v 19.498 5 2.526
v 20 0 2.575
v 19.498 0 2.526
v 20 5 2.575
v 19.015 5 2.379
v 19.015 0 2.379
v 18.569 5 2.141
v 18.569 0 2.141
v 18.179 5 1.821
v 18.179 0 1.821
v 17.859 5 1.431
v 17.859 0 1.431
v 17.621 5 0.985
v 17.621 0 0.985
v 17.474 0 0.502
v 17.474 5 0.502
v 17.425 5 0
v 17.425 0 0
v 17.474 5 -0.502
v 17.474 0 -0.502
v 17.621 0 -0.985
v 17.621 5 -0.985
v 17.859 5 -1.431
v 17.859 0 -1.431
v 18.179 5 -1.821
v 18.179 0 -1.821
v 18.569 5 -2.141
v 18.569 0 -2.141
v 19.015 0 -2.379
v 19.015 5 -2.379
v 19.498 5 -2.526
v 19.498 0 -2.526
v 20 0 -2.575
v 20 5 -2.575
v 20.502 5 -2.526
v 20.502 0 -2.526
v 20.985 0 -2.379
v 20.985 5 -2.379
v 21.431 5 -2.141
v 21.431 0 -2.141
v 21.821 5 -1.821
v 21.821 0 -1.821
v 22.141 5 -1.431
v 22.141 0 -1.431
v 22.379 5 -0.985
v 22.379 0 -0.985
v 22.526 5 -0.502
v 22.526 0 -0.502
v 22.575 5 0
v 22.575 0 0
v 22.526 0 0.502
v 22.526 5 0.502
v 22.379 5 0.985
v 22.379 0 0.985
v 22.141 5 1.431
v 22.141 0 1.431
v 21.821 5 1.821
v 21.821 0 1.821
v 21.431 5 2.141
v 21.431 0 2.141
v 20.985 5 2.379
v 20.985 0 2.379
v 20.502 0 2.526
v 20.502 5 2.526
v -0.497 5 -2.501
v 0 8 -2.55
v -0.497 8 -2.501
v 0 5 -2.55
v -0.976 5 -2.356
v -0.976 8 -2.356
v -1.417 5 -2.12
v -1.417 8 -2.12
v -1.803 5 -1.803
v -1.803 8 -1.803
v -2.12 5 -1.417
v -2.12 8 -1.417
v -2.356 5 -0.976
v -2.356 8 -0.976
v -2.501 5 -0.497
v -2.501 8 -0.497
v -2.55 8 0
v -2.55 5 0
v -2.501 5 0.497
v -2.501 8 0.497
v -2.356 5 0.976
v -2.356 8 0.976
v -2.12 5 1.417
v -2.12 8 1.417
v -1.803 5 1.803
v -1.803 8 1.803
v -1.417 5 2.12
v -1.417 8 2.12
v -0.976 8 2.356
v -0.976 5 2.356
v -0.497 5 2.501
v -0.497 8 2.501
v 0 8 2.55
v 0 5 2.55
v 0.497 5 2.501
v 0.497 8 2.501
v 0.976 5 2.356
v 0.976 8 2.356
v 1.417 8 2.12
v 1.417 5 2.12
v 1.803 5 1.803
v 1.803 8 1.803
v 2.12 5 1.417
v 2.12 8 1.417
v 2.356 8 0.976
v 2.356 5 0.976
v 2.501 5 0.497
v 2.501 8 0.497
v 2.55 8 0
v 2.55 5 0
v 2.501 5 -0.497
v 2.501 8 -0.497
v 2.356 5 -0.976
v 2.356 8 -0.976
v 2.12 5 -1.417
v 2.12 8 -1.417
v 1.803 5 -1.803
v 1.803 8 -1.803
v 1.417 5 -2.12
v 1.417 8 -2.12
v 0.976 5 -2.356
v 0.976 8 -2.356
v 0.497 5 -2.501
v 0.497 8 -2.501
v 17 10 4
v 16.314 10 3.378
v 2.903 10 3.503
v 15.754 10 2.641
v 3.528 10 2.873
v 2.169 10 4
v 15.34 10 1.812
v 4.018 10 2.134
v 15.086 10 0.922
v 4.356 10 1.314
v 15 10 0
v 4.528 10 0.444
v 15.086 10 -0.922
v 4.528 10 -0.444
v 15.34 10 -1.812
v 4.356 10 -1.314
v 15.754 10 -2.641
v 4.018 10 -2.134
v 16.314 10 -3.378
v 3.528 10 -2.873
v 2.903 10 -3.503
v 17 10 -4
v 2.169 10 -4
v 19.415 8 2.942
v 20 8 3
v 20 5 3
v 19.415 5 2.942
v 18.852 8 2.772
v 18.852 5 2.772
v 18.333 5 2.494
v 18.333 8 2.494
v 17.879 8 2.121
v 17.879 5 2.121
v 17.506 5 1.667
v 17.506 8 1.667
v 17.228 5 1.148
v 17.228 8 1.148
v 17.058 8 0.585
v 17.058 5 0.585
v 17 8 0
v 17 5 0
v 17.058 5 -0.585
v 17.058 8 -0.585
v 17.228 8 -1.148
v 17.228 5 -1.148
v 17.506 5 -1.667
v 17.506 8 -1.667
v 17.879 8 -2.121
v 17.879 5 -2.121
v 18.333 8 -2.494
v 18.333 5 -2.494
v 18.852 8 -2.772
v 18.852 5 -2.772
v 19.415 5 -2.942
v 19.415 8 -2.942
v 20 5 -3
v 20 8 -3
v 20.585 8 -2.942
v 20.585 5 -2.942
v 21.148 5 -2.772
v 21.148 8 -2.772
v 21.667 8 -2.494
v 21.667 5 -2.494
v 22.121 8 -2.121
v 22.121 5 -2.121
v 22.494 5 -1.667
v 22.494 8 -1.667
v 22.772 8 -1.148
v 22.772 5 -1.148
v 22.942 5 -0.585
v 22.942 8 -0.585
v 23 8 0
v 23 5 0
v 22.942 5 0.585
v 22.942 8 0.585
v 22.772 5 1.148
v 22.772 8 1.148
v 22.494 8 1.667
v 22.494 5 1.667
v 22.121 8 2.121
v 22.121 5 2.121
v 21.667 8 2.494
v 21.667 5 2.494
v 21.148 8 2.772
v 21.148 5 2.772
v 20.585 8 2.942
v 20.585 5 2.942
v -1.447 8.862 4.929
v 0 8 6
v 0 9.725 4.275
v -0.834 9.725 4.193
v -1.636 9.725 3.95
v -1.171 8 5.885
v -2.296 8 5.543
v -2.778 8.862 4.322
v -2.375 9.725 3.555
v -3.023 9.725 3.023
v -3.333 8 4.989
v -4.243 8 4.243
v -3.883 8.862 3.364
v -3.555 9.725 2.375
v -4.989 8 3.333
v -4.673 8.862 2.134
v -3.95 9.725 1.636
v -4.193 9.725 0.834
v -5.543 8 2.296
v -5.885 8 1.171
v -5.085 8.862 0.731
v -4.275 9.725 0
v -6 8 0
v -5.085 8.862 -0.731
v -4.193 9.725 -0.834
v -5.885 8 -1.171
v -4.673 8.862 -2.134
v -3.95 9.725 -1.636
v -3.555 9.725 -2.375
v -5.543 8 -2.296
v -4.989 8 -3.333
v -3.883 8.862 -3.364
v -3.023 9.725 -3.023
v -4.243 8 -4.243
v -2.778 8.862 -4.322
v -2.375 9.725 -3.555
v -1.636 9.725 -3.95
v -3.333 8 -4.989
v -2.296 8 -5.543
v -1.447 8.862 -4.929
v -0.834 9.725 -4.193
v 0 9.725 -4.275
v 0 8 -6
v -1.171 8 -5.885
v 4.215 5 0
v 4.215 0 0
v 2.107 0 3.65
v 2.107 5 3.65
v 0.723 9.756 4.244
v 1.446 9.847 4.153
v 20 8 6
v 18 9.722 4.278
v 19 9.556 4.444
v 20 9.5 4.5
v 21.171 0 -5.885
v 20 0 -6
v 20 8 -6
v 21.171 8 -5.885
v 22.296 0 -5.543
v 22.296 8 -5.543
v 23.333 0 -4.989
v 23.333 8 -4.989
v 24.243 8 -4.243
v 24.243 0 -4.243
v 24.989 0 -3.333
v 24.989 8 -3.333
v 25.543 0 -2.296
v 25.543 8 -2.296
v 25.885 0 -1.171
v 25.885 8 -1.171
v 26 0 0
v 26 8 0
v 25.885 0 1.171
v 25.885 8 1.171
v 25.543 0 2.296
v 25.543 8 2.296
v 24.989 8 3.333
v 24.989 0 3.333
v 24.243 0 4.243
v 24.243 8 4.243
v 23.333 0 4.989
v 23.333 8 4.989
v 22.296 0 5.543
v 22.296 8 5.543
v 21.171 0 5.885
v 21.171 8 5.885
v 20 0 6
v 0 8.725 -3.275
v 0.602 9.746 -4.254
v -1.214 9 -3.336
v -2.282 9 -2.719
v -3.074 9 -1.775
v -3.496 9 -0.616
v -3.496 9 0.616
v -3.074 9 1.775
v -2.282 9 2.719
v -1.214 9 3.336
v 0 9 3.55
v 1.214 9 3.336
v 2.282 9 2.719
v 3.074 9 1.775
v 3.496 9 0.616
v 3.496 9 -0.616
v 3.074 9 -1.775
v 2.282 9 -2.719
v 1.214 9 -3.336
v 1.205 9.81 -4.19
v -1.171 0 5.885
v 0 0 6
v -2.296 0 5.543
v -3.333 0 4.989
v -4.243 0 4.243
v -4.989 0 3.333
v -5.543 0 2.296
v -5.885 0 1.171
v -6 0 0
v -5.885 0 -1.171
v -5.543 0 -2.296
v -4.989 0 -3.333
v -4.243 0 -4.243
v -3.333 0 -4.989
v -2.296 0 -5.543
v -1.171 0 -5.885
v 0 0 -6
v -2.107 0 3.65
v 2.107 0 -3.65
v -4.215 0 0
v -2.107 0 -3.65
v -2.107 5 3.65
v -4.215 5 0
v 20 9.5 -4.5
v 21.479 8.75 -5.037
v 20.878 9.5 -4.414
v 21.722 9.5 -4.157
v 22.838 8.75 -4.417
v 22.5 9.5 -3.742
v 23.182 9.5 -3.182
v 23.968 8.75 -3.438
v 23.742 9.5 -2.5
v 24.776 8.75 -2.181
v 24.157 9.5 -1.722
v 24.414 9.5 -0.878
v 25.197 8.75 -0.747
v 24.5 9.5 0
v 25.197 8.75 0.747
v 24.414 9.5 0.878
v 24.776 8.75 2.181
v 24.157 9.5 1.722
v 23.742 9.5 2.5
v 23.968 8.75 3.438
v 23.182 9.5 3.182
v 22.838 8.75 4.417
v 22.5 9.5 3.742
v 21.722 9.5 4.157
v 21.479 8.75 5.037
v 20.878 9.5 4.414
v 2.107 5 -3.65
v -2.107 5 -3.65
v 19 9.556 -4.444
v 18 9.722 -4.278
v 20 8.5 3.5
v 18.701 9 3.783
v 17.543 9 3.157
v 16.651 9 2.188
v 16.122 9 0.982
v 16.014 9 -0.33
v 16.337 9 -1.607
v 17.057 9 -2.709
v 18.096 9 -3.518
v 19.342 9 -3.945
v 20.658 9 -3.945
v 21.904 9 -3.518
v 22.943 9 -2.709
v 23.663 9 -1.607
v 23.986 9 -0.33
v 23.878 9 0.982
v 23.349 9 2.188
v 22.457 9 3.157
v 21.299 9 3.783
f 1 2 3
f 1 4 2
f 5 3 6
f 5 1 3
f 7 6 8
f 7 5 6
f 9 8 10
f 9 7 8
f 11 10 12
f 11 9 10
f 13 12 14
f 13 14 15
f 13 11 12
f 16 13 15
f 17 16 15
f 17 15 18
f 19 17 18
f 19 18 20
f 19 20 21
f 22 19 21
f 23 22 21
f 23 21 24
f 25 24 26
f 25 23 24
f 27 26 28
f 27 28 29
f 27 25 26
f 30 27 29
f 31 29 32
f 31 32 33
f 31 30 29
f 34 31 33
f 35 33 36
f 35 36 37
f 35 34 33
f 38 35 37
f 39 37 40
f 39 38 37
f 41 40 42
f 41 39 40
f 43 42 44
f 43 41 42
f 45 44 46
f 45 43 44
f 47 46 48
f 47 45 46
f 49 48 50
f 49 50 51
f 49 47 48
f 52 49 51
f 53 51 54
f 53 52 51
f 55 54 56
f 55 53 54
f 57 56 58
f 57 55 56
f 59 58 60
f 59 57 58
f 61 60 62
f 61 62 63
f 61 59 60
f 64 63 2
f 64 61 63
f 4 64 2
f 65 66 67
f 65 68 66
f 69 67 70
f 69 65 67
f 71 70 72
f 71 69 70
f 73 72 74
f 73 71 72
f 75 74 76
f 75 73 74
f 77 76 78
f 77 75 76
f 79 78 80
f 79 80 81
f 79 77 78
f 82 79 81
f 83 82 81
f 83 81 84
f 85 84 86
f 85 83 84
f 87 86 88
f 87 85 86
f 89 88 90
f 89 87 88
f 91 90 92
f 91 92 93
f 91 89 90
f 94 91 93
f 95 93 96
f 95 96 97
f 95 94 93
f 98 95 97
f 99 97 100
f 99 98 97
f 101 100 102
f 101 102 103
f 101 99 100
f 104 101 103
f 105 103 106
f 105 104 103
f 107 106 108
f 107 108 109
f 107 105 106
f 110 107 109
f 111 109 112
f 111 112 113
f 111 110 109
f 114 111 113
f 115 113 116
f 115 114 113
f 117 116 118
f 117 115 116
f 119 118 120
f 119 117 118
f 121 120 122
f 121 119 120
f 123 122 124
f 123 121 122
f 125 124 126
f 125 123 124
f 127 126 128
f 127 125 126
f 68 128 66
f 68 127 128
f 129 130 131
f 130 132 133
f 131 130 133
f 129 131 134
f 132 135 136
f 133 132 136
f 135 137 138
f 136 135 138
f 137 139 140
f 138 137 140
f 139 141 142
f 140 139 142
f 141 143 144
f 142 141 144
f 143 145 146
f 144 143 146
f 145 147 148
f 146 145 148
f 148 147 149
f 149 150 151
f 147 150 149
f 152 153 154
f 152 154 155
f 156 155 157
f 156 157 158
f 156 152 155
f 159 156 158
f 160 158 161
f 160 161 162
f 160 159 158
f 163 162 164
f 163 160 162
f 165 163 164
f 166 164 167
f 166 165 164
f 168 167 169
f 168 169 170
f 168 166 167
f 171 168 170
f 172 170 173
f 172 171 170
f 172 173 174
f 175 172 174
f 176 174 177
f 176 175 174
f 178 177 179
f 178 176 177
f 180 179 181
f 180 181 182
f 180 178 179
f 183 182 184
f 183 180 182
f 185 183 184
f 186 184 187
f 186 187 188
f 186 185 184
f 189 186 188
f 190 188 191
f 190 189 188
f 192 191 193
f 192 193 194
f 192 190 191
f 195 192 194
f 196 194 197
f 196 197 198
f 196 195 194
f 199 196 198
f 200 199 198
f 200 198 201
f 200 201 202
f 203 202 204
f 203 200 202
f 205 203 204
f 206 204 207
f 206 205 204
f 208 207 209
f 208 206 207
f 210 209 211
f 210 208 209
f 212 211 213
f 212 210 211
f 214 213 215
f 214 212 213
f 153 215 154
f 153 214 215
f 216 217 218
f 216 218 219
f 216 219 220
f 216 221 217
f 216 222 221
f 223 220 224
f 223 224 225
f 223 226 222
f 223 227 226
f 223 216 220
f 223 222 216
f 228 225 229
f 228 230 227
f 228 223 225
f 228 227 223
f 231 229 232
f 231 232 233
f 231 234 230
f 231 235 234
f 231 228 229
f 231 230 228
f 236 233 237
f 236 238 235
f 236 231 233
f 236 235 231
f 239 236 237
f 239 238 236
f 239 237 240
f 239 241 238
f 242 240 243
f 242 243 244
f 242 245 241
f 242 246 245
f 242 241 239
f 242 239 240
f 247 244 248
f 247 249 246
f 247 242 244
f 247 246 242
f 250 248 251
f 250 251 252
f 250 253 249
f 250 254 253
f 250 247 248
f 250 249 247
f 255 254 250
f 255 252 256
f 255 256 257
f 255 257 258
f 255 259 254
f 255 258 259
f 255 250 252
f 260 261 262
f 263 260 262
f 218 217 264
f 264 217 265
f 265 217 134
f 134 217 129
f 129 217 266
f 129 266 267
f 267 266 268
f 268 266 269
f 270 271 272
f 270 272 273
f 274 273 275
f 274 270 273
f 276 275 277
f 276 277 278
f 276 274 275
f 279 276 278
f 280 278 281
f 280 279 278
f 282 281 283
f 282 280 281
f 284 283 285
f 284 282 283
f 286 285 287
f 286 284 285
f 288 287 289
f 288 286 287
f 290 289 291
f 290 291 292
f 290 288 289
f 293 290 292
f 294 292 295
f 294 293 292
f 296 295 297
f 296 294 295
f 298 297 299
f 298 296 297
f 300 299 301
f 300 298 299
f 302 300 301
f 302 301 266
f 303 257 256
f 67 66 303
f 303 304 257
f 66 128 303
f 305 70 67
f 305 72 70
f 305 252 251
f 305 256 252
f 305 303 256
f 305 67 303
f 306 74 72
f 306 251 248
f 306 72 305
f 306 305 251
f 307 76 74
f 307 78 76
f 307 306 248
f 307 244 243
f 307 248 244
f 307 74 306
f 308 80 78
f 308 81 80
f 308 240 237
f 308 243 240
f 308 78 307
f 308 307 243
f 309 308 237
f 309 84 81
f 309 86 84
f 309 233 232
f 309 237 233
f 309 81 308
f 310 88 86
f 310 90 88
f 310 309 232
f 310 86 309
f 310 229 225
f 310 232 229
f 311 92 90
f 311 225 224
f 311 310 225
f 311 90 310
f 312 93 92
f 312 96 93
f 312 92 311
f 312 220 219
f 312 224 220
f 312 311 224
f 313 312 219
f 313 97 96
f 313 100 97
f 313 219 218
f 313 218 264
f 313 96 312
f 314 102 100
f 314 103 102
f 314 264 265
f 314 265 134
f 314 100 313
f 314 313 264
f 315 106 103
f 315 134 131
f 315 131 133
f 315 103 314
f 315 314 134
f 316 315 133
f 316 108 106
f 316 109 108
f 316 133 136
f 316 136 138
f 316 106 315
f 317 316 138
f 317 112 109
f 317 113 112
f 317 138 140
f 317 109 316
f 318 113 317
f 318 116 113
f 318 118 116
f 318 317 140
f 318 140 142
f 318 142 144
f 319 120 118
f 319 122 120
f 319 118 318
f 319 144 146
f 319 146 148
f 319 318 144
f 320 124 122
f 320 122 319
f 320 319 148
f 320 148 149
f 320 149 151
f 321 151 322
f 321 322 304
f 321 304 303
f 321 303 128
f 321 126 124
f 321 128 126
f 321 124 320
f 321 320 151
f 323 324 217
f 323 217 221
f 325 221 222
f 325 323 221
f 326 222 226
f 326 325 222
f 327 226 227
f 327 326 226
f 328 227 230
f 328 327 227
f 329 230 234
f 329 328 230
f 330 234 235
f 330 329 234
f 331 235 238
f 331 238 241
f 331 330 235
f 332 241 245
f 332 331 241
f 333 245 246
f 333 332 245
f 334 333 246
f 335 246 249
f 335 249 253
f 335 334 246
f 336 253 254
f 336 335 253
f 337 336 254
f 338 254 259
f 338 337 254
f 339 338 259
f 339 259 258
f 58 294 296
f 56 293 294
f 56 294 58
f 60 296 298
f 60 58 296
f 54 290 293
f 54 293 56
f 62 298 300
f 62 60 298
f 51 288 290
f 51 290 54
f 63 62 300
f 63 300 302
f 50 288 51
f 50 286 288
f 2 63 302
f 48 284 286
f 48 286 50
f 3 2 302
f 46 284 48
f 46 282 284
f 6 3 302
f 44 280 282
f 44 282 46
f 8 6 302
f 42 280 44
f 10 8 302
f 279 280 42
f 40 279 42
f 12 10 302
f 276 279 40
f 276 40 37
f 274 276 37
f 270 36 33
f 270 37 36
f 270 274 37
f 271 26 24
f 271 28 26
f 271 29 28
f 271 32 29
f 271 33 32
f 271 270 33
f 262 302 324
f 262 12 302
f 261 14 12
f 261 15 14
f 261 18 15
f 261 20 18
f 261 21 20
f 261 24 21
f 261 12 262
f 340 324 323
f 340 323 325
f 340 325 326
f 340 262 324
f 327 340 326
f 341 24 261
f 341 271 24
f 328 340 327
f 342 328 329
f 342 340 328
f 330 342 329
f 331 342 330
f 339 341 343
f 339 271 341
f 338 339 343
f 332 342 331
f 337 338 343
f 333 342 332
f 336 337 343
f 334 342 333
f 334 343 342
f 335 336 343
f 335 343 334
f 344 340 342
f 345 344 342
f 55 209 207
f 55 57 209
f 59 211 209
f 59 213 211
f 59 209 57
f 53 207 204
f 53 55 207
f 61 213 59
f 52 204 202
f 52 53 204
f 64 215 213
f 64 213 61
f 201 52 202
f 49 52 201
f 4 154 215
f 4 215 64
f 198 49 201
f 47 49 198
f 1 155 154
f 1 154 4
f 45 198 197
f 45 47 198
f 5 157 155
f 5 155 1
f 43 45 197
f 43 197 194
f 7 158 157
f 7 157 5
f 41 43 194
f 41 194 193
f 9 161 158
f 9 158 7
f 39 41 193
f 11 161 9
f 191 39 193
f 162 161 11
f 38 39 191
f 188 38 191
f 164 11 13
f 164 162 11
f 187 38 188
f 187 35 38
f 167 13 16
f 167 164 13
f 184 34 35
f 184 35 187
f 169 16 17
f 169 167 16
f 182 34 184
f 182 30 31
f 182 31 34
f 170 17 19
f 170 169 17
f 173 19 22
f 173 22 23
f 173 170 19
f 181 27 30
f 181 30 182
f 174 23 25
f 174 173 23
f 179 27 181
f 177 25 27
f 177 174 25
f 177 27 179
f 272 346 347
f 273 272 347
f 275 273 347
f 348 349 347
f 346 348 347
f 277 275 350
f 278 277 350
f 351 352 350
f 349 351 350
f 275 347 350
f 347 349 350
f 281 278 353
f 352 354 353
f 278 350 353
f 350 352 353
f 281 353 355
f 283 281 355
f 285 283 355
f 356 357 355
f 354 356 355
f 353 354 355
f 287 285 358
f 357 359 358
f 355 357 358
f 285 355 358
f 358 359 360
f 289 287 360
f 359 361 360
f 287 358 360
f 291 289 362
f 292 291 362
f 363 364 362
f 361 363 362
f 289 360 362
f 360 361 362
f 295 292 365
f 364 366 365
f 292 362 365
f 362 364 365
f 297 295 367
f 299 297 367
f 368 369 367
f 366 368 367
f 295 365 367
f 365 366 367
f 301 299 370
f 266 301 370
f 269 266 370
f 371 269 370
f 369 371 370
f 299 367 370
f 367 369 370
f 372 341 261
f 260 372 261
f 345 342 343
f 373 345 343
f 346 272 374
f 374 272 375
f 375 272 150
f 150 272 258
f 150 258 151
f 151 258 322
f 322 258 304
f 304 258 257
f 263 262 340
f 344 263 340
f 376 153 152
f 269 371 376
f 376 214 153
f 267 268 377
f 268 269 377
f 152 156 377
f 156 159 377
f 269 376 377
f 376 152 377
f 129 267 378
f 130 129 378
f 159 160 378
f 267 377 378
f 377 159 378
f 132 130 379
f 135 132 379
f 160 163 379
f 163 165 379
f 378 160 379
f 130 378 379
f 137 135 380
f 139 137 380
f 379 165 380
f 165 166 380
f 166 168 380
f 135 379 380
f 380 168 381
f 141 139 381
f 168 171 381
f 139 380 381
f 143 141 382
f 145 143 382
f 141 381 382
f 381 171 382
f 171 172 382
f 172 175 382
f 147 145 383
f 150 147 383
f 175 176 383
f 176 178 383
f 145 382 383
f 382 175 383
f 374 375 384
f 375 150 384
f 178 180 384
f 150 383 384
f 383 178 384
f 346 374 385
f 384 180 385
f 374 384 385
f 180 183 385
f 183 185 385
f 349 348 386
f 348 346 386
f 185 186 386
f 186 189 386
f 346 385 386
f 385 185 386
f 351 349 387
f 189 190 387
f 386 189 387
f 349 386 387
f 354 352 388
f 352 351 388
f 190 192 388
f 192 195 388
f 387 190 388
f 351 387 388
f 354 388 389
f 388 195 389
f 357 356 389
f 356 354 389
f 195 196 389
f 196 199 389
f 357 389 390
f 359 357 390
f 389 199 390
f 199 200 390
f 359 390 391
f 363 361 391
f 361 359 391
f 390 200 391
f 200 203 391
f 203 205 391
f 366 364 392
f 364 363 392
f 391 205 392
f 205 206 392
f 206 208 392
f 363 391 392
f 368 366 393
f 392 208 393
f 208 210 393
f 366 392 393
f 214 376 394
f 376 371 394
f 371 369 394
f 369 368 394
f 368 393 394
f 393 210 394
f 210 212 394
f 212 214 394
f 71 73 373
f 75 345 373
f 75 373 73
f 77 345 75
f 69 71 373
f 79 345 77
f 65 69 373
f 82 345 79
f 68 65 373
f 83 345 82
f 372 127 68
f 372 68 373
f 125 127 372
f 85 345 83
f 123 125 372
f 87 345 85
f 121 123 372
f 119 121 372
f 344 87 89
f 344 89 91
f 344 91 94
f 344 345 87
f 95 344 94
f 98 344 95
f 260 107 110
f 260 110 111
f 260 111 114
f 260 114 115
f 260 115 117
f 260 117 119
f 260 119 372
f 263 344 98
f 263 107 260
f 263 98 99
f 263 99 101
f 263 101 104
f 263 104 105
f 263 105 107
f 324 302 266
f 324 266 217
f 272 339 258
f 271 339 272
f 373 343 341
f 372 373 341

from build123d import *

# Parameters (mm, degrees)
EXTRUDE_1_DEPTH     = 10
CHAMFER_1_SIZE      = 2
CUT_EXTRUDE_1_DEPTH = 5


with BuildPart() as part:
    # 草图1 → 凸台-拉伸1 (new body)
    with BuildSketch(Plane(origin=(0, 0, 0), x_dir=(1, 0, 0), z_dir=(0, 1, 0))):
        with BuildLine():
            Line((0, 6), (20, 6))
            ThreePointArc((20, 6), (26, 0), (20, -6))
            Line((20, -6), (0, -6))
            ThreePointArc((0, -6), (-6, 0), (0, 6))
        make_face()
    extrude(amount=EXTRUDE_1_DEPTH)

    # 草图2 → 切除-旋转1 (revolve, cut)
    with BuildSketch(Plane.XY, mode=Mode.PRIVATE) as cut_revolve_1_sk:
        Polygon((-2.55, 10), (-2.55, 5), (-1.6, 5), (-1.6, 2), (-2.55, 2), (-2.55, 0), (0, 0), (0, 10), align=None)
    revolve(cut_revolve_1_sk.sketch.rotate(Axis((0, 0, 0), (0, 1, 0)), 270), axis=Axis((0, 0, 0), (0, 1, 0)), mode=Mode.SUBTRACT)

    # 草图3 → 切除-旋转2 (revolve, cut)
    with BuildSketch(Plane.XY, mode=Mode.PRIVATE) as cut_revolve_2_sk:
        Polygon((20, 0), (17.425, 0), (17.425, 5), (17, 5), (17, 10), (20, 10), align=None)
    revolve(cut_revolve_2_sk.sketch.rotate(Axis((20, 10, 0), (0, -1, 0)), 270), axis=Axis((20, 10, 0), (0, -1, 0)), mode=Mode.SUBTRACT)

    # 倒角1
    # the kernel refuses this chamfer: 2 mm, written as the material it takes off along each edge
    with BuildSketch(Plane(origin=(20, 10, 0), x_dir=(0, 0, -1), z_dir=(-1, 0, 0))) as chamfer_1_piece_1:
        Polygon((6, CHAMFER_1_SIZE), (6 - CHAMFER_1_SIZE, 0), (6, 0), align=None)
    revolve(axis=Axis((20, 10, 0), (0, -1, 0)), revolution_arc=180, mode=Mode.SUBTRACT)
    with BuildSketch(Plane(origin=(0, 10, 0), x_dir=(0, 0, -1), z_dir=(1, 0, 0))) as chamfer_1_piece_2:
        Polygon((2.55 + CHAMFER_1_SIZE, 0), (2.55, -CHAMFER_1_SIZE), (2.55, 0), align=None)
    revolve(axis=Axis((0, 10, 0), (0, 1, 0)), mode=Mode.SUBTRACT)
    with BuildSketch(Plane(origin=(0, 10, -6), x_dir=(0, -0.9996219169112968, -0.027495876610586487), z_dir=(1, 0, 0)), Plane(origin=(20, 10, 6), x_dir=(0, -0.9996219169112968, 0.027495876610586487), z_dir=(-1, 0, 0))) as chamfer_1_piece_3:
        Polygon((CHAMFER_1_SIZE * 0.999621916911, -CHAMFER_1_SIZE * 0.0274958766106), (-CHAMFER_1_SIZE * 0.0274958766106, -CHAMFER_1_SIZE * 0.999621916911), (0, 0), align=None)
    extrude(amount=20, mode=Mode.SUBTRACT)
    with BuildSketch(Plane(origin=(20, 10, 0), x_dir=(0, 0, 1), z_dir=(1, 0, 0))) as chamfer_1_piece_4:
        Polygon((3 + CHAMFER_1_SIZE, 0), (3, CHAMFER_1_SIZE), (3, 0), align=None)
    revolve(axis=Axis((20, 10, 0), (0, -1, 0)), mode=Mode.SUBTRACT)
    with BuildSketch(Plane(origin=(0, 10, 0), x_dir=(0, 0, 1), z_dir=(1, 0, 0))) as chamfer_1_piece_5:
        Polygon((6 - CHAMFER_1_SIZE, 0), (6, CHAMFER_1_SIZE), (6, 0), align=None)
    revolve(axis=Axis((0, 10, 0), (0, -1, 0)), revolution_arc=180, mode=Mode.SUBTRACT)

    # 草图4 → 切除-拉伸1 (cut)
    with BuildSketch(Plane.XZ):
        Polygon((-2.107328483, -3.65), (2.107328483, -3.65), (4.214656965, 0), (2.107328483, 3.65), (-2.107328483, 3.65), (-4.214656965, 0), align=None)
    extrude(amount=-CUT_EXTRUDE_1_DEPTH, mode=Mode.SUBTRACT)


solid = part.part
